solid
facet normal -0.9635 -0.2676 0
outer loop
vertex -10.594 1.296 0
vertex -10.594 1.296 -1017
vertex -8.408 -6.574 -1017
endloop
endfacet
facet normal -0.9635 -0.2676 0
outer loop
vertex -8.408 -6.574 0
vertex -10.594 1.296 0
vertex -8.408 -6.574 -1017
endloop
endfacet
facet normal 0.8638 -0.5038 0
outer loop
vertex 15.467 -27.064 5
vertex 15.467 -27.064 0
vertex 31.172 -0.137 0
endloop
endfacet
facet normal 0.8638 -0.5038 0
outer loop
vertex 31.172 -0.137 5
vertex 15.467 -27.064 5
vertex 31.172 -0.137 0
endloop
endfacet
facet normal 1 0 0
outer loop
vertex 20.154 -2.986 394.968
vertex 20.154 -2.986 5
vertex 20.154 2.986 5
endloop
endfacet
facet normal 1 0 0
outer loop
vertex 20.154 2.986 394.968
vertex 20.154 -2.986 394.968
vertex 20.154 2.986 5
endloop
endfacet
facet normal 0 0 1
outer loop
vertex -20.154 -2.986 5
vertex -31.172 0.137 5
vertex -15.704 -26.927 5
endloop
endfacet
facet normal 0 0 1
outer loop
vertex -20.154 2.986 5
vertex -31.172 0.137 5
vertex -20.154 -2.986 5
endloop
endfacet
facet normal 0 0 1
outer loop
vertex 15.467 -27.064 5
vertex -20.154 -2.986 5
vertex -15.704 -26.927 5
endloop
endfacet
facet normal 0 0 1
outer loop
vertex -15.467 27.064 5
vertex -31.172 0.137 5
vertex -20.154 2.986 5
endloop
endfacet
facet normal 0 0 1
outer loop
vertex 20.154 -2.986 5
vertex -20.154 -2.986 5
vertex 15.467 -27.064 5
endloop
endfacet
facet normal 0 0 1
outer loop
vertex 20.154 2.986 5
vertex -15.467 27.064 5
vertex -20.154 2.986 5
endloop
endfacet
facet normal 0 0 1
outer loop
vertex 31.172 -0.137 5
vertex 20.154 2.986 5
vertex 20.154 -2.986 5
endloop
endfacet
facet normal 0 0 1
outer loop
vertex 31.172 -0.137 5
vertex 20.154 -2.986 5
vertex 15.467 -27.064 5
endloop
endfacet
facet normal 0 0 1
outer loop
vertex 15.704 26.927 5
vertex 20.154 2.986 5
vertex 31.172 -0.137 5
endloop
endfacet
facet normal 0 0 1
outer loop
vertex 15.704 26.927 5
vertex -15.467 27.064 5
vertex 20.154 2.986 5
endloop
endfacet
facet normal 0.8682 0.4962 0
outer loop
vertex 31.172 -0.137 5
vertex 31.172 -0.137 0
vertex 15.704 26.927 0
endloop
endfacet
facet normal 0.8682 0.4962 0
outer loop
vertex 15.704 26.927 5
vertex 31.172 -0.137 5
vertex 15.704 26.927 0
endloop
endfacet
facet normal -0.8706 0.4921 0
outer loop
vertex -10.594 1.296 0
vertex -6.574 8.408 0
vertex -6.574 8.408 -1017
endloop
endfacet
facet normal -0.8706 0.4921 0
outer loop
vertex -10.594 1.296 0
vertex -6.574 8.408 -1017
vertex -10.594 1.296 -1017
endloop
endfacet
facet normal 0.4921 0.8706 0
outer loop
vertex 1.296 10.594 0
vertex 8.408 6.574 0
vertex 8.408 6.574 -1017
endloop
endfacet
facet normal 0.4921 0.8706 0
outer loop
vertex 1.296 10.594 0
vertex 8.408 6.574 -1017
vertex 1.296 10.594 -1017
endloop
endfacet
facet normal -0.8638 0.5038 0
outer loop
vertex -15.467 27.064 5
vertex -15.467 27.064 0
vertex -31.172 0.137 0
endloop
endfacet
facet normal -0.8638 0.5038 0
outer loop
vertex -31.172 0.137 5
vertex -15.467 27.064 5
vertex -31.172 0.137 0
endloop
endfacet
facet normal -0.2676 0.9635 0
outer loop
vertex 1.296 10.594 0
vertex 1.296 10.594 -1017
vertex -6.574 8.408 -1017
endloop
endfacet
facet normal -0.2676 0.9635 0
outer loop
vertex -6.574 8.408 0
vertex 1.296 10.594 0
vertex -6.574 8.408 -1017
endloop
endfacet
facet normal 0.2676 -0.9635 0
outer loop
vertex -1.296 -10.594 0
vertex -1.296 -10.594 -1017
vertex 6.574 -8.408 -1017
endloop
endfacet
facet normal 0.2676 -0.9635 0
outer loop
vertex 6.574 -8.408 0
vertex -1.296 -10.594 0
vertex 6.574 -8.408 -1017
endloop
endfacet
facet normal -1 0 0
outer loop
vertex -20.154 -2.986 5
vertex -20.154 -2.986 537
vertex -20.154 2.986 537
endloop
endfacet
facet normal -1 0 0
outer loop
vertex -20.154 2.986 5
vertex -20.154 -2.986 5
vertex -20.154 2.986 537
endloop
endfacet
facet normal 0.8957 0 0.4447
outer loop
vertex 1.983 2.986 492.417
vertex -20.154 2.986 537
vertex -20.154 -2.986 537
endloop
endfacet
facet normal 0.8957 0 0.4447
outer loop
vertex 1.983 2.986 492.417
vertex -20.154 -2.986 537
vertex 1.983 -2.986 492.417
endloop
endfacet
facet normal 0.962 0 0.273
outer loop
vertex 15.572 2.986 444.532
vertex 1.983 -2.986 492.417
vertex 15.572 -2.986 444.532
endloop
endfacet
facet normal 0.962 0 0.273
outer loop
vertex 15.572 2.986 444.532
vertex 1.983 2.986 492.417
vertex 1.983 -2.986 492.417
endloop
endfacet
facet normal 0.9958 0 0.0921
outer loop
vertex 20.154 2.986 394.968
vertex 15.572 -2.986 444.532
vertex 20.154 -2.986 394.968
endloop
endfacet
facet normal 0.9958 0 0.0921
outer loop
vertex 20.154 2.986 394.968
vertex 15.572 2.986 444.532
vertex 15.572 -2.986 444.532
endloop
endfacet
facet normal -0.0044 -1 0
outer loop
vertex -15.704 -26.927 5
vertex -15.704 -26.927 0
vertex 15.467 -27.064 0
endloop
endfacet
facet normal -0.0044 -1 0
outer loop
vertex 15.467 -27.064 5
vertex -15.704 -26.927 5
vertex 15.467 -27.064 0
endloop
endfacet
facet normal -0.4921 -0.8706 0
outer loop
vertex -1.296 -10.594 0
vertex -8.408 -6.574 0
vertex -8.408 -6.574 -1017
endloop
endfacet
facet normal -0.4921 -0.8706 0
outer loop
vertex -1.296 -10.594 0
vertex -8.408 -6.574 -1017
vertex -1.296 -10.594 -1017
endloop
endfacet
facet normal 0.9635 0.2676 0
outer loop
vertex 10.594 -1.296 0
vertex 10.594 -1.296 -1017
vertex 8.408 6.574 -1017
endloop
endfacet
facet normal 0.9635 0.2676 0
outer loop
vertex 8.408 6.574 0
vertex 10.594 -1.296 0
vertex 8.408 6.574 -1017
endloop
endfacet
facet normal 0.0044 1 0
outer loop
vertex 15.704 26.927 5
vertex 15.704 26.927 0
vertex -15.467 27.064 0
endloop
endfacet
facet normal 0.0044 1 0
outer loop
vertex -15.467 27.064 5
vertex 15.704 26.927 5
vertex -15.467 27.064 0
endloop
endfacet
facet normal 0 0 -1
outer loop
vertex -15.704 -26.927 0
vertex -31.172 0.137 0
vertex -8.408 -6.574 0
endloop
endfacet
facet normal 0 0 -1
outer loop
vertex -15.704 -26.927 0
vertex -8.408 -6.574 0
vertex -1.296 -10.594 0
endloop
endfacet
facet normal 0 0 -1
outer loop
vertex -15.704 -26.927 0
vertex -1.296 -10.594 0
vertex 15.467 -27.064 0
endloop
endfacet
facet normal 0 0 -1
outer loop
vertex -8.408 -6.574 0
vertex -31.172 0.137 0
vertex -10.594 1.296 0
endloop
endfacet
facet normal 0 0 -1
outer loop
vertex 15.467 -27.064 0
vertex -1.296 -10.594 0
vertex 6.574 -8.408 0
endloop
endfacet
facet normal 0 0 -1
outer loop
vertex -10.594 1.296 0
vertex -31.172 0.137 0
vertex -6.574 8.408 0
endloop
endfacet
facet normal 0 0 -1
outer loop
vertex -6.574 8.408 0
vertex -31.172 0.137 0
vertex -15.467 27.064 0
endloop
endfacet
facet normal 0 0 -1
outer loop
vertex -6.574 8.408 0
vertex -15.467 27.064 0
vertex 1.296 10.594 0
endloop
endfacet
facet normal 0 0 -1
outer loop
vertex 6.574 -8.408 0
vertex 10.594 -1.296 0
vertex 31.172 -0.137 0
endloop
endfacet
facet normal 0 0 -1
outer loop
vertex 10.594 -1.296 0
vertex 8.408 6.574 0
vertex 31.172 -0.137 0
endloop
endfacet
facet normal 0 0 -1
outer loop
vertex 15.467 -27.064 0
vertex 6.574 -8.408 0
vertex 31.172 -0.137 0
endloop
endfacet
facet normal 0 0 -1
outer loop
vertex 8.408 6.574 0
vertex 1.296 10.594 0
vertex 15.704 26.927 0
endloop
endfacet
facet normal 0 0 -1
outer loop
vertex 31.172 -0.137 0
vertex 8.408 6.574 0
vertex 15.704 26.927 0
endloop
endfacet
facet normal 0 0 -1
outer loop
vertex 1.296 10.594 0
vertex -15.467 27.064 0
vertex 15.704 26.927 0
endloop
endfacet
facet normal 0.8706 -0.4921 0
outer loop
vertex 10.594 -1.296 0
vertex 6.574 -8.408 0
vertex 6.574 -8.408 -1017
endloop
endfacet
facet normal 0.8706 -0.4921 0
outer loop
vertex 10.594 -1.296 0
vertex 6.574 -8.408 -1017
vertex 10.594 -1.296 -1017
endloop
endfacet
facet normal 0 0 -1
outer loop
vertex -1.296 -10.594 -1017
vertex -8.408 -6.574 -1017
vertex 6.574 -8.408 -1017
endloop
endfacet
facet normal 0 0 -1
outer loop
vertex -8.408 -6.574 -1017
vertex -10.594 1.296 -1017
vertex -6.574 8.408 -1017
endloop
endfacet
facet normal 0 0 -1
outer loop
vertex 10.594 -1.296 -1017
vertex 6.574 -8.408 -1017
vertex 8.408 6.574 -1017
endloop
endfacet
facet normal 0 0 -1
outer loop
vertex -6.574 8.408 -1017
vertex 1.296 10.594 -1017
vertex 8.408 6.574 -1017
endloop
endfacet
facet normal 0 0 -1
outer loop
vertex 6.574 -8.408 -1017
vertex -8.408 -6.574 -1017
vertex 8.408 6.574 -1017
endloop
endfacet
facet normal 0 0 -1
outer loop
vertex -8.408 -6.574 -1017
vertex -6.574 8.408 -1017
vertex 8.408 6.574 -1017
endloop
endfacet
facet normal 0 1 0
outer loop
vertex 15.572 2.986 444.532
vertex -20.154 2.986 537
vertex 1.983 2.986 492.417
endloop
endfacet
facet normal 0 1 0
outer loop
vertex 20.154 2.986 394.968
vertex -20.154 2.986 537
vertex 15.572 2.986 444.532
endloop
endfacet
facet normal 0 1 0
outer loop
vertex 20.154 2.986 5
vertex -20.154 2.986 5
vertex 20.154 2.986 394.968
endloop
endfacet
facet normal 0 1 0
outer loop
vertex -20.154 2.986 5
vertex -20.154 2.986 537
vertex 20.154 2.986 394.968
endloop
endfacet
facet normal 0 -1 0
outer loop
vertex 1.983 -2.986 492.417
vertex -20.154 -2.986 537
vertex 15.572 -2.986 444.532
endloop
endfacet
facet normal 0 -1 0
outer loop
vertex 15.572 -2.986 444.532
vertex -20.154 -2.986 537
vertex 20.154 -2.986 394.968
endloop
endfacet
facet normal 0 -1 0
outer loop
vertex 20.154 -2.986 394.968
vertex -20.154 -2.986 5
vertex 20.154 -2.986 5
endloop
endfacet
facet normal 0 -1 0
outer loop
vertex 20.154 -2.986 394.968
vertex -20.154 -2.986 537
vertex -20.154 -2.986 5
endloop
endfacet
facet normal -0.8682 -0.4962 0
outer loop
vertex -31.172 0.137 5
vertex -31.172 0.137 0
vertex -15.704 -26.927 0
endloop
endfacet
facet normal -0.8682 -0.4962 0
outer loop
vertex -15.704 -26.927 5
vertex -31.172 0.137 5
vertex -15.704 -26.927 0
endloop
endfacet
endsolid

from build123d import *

# Parameters (mm, degrees)
F0_W        = 40.3080582619
F0_H        = 5.9715644456
F1_DEPTH    = 537
F3_DEPTH    = 1017
F5_DEPTH    = 5
F6_T1_DEPTH = 716.1336390313


# Not quite as in the source:
# - a fillet or chamfer that OpenCascade refuses, or shapes differently, is made with other operations: its cross-section is extruded or revolved along the edge and cut away or added


with BuildPart() as f1:
    # F0 (on Top) → F1 (new body)
    with BuildSketch(Plane.XY):
        Rectangle(F0_W, F0_H)
    extrude(amount=F1_DEPTH)

    # F2 (on Top) → F3 (join)
    with BuildSketch(Plane.XY):
        Polygon((6.5744029718, -8.407556447), (10.5938451005, -1.2962352533), (8.407556447, 6.5744029718), (1.2962352533, 10.5938451005), (-6.5744029718, 8.407556447), (-10.5938451005, 1.2962352533), (-8.407556447, -6.5744029718), (-1.2962352533, -10.5938451005), align=None)
    extrude(amount=-F3_DEPTH)

    # F4 (on Top) → F5 (join)
    with BuildSketch(Plane.XY):
        Polygon((31.1715127681, -0.1368859226), (15.7043030704, 26.9268789703), (-15.4672096977, 27.0637648929), (-31.1715127681, 0.1368859226), (-15.7043030704, -26.9268789703), (15.4672096977, -27.0637648929), align=None)
    extrude(amount=F5_DEPTH)

    # F6: fillet of radius 270.3919189858 on 1 edges, made by hand

    # F6_s2 → F6_t1 (cut)
    with BuildSketch(Plane.XZ.offset(-358.0668195157)):
        with BuildLine():
            ThreePointArc((-20.1540291309, 537), (9.881896476, 468.7882231999), (20.1540291309, 394.9675850829))
            Line((20.1540291309, 394.9675850829), (20.1540291309, 537))
            Line((20.1540291309, 537), (-20.1540291309, 537))
        make_face()
    extrude(amount=F6_T1_DEPTH, mode=Mode.SUBTRACT)


solid = f1.part
